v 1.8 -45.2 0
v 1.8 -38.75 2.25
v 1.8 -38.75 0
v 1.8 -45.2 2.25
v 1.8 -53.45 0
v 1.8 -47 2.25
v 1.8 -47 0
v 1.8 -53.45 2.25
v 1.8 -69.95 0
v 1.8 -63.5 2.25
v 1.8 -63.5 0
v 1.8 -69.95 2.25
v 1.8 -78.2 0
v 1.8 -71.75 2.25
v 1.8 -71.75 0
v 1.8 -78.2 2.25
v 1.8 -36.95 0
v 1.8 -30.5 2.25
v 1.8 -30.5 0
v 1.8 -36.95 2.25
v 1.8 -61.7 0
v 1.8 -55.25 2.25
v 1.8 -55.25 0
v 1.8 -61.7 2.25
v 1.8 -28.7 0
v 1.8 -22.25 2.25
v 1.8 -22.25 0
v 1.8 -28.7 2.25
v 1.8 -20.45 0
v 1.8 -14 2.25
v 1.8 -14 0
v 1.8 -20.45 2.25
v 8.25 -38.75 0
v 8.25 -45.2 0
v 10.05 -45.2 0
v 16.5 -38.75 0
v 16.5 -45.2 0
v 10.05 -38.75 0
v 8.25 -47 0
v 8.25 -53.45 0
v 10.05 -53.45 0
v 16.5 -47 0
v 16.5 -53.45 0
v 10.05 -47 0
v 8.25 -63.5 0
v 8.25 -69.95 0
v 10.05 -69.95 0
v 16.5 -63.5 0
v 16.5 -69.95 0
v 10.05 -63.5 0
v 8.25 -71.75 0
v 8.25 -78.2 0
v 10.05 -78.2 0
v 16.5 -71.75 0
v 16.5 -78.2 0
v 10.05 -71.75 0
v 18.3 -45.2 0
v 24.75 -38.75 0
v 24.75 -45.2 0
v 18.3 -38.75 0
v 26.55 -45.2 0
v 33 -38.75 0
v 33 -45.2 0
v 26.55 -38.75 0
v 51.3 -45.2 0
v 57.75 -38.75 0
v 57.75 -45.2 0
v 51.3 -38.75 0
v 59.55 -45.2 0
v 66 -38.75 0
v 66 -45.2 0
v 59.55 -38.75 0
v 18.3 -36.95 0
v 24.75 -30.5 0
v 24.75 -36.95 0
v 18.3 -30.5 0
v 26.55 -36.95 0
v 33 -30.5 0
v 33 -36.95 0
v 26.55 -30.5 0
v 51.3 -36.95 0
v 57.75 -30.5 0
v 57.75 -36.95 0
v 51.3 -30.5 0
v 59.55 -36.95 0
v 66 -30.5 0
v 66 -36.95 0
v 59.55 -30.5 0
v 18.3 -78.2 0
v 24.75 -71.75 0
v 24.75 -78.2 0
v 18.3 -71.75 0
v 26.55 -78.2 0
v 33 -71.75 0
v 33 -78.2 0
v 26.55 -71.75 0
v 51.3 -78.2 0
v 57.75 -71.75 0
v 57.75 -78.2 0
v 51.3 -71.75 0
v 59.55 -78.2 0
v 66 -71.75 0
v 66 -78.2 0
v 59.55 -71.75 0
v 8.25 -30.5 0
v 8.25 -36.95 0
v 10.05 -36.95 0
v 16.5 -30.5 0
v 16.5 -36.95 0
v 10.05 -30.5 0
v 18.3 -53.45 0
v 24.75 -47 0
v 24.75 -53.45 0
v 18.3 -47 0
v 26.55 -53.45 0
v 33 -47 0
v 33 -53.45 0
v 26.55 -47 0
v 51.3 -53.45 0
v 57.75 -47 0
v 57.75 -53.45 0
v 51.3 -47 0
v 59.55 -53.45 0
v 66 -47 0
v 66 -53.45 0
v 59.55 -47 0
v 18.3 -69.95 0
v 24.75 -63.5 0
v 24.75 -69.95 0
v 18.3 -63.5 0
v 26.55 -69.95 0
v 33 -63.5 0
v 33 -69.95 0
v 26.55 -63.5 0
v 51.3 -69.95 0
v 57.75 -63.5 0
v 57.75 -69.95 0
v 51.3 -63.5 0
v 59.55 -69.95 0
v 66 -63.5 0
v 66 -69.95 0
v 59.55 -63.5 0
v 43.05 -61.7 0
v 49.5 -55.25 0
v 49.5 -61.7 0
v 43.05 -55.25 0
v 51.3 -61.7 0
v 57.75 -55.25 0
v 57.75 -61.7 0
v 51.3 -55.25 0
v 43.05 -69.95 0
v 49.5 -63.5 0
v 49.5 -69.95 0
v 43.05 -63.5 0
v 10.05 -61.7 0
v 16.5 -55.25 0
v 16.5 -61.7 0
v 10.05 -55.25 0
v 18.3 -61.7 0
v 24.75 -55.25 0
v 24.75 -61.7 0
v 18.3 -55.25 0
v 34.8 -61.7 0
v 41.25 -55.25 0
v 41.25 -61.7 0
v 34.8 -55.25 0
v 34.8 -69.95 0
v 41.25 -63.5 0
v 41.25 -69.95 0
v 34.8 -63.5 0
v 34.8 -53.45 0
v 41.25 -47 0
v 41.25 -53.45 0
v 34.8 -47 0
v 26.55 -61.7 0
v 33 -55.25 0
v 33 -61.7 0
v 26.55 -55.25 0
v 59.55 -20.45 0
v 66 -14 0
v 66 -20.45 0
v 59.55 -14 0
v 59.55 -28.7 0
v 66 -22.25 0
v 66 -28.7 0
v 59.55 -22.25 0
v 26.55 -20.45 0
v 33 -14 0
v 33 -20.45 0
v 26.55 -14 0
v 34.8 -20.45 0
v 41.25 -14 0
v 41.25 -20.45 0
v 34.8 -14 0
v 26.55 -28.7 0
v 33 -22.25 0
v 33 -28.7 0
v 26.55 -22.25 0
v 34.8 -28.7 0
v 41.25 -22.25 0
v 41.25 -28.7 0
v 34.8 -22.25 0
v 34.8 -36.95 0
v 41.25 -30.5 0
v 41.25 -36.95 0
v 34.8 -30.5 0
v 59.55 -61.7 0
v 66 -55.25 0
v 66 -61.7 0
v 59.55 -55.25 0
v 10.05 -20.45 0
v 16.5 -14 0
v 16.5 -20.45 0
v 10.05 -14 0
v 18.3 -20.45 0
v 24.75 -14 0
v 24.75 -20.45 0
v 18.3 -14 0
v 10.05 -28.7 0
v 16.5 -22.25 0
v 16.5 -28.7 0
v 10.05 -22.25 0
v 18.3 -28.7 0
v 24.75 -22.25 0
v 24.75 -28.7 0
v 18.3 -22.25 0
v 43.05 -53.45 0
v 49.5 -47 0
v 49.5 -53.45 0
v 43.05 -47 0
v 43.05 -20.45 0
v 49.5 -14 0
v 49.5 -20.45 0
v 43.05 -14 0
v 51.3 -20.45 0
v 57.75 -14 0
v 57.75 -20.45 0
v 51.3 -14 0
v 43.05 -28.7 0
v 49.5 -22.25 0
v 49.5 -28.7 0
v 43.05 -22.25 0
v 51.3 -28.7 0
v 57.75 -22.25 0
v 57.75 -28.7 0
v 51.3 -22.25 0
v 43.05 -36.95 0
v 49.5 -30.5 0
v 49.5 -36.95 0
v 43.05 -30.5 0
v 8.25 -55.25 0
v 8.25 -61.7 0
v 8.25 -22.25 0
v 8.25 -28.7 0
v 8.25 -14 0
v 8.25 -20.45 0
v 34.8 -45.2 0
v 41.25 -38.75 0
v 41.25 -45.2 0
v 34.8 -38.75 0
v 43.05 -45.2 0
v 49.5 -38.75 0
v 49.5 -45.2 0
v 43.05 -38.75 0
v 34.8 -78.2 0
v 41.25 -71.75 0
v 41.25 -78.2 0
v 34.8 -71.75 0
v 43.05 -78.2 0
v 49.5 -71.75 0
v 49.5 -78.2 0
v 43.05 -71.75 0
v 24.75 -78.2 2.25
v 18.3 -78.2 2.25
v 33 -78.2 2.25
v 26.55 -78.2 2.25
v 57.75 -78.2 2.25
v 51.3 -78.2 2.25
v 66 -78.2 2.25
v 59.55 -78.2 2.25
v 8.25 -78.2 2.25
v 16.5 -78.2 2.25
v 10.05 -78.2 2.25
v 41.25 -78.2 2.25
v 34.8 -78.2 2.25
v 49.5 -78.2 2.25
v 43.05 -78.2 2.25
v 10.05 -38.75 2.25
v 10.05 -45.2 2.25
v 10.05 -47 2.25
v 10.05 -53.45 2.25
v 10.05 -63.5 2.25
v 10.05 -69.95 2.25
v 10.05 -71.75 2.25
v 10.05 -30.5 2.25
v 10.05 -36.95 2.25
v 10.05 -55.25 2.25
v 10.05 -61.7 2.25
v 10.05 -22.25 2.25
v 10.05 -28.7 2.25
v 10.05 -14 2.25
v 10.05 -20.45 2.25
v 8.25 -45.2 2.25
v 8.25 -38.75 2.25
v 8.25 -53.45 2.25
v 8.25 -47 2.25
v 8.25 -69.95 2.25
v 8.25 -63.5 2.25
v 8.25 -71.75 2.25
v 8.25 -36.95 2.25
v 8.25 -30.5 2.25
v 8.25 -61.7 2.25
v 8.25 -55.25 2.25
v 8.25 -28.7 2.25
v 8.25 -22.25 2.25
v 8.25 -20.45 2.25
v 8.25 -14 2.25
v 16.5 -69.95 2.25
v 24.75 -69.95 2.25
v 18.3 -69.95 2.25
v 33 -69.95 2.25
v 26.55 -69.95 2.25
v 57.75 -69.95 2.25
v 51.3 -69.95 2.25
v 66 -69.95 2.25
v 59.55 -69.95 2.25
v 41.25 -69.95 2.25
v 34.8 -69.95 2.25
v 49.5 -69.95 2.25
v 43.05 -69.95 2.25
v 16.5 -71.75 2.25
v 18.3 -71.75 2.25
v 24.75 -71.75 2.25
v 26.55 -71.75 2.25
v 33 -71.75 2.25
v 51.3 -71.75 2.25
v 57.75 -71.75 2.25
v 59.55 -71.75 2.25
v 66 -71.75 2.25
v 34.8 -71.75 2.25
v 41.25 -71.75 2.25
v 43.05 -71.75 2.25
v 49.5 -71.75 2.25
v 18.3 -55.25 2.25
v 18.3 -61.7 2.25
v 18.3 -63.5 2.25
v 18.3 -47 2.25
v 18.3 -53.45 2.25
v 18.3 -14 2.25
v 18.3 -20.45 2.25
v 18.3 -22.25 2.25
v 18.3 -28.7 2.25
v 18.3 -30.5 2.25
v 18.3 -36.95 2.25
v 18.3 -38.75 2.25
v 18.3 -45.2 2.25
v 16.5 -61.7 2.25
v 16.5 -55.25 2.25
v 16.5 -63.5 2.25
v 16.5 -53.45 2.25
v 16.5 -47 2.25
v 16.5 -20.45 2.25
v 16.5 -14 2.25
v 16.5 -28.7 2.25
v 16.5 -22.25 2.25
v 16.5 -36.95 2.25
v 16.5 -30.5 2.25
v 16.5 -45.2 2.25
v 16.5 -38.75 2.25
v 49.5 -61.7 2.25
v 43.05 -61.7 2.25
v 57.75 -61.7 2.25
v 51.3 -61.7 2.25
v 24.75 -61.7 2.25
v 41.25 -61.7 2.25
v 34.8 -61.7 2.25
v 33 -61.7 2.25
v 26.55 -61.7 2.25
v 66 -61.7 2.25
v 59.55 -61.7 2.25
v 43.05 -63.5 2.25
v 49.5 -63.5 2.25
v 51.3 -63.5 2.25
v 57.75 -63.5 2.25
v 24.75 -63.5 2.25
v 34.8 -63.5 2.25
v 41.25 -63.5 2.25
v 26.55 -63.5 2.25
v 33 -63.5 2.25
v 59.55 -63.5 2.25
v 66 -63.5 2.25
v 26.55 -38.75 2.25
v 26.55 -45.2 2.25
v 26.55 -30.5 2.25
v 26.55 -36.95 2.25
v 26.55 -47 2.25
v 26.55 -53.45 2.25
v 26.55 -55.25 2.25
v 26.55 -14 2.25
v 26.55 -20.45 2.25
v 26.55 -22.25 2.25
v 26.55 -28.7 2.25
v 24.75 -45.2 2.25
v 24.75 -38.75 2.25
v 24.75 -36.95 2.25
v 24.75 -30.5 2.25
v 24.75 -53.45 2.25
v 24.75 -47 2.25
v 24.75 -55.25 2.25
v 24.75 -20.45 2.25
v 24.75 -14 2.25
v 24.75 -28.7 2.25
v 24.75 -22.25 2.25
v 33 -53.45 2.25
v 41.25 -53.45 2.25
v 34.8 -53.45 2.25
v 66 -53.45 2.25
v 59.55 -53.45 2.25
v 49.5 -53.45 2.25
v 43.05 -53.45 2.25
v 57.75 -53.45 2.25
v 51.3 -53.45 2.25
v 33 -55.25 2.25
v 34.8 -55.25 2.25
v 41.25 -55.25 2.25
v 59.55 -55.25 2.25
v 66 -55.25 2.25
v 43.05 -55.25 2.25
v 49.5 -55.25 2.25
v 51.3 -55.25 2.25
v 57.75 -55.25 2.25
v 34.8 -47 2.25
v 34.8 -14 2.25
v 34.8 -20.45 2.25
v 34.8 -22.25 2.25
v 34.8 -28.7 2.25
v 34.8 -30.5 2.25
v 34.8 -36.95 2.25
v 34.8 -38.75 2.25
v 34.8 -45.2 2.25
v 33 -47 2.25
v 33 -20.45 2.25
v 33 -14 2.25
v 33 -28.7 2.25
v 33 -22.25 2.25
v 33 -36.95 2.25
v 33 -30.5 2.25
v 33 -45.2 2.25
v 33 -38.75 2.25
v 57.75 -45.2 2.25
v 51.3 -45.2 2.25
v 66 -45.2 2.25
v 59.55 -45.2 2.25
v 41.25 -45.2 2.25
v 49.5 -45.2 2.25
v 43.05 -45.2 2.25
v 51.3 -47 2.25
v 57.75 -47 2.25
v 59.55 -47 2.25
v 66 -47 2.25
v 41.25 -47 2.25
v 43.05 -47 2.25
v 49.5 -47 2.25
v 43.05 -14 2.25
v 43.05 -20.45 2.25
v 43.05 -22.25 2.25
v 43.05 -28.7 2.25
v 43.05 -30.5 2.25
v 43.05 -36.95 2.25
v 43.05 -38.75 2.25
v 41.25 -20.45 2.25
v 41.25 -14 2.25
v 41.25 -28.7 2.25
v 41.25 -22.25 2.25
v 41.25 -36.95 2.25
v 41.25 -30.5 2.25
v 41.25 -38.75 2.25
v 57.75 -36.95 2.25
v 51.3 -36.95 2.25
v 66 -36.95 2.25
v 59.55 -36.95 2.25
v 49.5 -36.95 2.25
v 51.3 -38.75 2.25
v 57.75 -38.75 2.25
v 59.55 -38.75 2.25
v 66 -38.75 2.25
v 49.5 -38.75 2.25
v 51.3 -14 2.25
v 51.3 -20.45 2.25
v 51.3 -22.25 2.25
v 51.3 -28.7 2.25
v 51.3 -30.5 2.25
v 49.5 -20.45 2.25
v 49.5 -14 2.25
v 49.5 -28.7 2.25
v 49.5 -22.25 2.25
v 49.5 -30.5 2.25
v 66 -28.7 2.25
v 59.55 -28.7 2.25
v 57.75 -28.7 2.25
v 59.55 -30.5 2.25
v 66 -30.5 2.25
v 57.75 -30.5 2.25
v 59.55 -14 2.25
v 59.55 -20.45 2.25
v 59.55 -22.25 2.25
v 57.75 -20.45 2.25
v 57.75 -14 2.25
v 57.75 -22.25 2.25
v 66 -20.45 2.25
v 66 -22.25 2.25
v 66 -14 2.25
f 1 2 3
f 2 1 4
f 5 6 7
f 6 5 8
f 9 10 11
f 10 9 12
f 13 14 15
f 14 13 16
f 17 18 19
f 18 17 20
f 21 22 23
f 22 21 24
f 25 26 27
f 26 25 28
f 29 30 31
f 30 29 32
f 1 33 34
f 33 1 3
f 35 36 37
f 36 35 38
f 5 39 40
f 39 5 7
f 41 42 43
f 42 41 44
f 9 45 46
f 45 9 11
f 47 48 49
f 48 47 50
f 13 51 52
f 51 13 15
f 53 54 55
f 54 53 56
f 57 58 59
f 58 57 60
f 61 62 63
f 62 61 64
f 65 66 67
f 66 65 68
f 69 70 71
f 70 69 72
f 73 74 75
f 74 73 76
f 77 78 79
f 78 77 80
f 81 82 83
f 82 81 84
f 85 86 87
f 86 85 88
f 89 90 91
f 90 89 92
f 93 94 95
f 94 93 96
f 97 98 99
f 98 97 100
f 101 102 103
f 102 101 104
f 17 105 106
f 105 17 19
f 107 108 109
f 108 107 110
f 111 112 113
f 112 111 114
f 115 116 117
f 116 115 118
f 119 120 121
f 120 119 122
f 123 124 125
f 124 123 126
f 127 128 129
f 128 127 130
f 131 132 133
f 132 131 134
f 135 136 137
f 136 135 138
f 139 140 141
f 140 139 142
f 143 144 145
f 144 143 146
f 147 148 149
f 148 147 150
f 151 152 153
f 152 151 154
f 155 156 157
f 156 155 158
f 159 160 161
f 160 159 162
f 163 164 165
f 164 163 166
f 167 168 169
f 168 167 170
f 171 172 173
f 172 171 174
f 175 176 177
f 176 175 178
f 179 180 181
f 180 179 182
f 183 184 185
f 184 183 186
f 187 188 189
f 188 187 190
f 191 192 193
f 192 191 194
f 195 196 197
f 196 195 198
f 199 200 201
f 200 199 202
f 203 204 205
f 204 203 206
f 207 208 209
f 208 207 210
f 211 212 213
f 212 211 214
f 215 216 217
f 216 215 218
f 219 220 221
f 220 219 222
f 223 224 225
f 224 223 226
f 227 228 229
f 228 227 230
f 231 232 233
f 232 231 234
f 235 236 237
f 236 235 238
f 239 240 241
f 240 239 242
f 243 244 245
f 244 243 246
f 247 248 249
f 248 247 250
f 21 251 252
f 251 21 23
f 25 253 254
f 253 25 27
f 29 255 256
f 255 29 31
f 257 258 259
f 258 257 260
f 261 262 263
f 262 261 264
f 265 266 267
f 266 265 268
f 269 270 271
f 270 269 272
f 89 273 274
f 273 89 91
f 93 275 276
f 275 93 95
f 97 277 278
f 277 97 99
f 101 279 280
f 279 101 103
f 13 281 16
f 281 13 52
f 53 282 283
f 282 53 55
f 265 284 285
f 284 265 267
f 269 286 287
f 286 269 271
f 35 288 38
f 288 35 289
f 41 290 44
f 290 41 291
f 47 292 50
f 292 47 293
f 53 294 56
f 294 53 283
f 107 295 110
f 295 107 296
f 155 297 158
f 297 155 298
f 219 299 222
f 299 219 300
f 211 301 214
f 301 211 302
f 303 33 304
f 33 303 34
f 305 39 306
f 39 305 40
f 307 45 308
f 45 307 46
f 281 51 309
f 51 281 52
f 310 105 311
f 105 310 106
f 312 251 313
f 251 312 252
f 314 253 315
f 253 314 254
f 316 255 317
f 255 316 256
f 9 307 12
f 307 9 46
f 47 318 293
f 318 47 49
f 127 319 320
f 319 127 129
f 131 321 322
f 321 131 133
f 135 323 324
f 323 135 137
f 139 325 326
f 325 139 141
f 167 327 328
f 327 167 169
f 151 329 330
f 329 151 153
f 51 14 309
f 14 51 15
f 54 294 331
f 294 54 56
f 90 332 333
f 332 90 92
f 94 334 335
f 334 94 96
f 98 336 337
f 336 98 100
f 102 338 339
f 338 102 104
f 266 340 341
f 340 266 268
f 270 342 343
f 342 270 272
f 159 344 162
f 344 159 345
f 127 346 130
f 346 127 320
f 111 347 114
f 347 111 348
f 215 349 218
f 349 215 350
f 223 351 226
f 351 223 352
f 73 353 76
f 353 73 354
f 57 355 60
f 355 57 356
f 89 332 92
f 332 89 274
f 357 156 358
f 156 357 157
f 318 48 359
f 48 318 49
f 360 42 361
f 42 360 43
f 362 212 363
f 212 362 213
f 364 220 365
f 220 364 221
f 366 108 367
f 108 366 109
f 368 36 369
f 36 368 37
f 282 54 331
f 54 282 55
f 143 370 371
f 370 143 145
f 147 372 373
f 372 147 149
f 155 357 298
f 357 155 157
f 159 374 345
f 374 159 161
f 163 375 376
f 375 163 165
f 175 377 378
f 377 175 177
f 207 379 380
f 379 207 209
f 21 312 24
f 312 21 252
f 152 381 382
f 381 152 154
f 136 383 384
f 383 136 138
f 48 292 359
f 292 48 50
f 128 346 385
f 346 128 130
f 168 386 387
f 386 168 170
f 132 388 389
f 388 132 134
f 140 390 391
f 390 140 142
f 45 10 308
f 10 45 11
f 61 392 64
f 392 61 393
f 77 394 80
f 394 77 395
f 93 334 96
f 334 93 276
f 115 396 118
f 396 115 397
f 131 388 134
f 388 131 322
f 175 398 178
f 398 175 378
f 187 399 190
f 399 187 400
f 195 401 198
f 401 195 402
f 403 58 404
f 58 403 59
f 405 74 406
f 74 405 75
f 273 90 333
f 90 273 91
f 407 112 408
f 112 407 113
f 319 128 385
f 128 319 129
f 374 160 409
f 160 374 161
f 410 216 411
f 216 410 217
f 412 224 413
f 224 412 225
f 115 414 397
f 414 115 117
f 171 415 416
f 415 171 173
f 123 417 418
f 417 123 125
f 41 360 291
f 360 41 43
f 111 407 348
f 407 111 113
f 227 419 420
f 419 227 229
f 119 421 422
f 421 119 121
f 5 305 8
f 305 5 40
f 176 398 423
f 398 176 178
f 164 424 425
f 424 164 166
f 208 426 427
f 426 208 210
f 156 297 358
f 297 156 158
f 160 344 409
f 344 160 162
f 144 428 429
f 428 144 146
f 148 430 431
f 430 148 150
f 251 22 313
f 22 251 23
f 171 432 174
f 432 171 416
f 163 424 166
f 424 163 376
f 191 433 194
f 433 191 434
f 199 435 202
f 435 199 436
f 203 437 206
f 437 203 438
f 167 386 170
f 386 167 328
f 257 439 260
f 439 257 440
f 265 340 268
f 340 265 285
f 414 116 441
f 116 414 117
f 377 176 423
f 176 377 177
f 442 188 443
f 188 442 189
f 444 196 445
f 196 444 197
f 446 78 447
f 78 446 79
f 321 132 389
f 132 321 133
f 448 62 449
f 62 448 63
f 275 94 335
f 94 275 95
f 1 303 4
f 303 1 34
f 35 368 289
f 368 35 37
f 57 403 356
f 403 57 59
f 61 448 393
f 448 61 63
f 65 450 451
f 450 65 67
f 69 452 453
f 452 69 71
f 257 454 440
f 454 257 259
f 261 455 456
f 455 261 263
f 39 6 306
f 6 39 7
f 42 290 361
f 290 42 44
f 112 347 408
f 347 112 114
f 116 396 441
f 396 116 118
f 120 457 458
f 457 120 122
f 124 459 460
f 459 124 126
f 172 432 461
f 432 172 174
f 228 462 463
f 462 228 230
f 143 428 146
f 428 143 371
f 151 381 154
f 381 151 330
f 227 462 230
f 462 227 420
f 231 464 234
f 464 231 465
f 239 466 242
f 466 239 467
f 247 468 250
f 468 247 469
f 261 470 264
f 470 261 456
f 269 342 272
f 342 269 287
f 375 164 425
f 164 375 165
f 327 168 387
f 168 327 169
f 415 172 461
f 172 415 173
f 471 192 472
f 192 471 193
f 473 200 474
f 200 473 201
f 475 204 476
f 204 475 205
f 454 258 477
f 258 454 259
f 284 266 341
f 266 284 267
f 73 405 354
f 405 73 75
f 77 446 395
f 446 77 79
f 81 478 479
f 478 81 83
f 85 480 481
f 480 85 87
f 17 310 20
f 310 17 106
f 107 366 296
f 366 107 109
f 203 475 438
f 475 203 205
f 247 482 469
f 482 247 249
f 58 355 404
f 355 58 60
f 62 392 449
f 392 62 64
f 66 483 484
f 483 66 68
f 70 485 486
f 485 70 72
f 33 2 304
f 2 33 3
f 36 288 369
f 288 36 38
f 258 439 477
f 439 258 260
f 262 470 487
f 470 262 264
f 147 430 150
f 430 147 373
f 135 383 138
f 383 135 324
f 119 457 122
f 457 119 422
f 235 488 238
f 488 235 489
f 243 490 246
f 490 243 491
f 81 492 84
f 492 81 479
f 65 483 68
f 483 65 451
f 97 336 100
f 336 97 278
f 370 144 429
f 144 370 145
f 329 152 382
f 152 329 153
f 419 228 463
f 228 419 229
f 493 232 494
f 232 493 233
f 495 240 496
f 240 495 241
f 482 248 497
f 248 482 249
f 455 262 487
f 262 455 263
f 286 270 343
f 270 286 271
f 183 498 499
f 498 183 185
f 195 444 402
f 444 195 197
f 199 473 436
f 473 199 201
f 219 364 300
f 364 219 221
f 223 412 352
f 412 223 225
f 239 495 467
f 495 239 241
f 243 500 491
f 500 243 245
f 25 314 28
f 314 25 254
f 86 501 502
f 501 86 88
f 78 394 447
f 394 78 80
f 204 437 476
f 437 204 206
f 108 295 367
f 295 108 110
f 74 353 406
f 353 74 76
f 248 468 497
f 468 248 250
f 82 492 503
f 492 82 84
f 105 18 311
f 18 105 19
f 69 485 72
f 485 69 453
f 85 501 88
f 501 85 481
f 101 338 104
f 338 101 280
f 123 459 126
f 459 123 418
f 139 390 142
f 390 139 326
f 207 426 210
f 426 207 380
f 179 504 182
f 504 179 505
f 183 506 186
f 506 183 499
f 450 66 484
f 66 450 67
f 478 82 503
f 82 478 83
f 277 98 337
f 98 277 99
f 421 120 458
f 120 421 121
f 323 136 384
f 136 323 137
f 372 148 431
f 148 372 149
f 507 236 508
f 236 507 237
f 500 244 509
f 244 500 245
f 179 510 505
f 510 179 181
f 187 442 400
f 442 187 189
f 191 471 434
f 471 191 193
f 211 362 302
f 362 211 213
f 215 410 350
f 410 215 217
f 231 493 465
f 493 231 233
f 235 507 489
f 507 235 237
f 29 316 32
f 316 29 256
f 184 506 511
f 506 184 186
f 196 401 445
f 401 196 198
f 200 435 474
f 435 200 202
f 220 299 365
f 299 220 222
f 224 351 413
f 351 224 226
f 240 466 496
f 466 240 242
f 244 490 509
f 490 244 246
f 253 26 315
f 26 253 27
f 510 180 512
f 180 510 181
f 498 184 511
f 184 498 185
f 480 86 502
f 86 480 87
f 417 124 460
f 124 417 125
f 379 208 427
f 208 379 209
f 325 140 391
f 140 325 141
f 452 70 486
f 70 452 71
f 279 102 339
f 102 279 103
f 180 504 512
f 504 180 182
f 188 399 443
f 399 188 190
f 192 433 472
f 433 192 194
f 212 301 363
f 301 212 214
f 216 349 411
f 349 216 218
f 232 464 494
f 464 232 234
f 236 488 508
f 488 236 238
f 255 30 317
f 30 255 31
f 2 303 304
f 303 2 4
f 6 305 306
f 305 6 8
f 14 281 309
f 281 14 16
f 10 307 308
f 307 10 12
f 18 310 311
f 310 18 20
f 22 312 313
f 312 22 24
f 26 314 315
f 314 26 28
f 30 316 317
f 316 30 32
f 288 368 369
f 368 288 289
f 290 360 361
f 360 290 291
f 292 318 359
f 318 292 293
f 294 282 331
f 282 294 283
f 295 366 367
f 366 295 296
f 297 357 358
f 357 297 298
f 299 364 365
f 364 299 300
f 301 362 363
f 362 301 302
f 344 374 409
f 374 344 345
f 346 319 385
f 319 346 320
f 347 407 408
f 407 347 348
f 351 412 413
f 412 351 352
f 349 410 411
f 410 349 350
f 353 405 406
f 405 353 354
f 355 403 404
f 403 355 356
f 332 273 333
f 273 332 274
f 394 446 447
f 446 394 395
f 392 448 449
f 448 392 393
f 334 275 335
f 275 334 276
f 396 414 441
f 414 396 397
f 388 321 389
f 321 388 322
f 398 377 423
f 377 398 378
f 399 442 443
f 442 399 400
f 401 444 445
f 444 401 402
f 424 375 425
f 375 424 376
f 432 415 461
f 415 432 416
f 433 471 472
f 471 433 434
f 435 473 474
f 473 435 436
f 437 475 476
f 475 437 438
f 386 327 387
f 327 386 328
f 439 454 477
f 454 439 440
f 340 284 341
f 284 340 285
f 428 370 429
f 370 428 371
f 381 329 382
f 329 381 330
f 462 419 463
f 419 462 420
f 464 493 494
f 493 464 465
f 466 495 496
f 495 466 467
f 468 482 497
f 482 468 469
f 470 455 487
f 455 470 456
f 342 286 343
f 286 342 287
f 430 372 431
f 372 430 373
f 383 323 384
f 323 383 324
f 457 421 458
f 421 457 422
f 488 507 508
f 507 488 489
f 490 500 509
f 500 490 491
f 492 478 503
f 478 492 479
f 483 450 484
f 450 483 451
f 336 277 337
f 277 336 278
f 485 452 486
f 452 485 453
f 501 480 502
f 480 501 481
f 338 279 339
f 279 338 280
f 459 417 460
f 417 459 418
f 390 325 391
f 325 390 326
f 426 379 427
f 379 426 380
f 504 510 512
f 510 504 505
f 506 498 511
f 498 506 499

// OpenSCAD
letters = [ 
    ["D", "I", "O", "N", "C", "E", "Z", "S"],
    ["N", "U", "S", "I", "E", "T", "V", "E"],
    ["C", "I", "N", "O", "C", "H", "O", "I"],
    ["C", "U", "A", "T", "R", "E", "O", "S"],
    ["Y", "M", "E", "N", "O", "S", "M", "E"],
    ["C", "U", "A", "R", "T", "O", "D", "I"],
    ["V", "E", "I", "N", "T", "I", "E", "A"],
    ["D", "C", "I", "N", "E", "Z", "C", "O"],    
];

$fn = 64;
max = 66;   // led side?
s = 66/8;
d_h = 5;    // led dividers?
w_h = 10;   // face height
b_h = 5;    // dividers height
c_h = 35;   // base height
letter_depth = w_h+1;

diffusers_height = 2.25;

font_face = "stencil std";
font_brand = "futura";

module face()
{
	for (r = [0:7])
	{
		for (c = [0:7])
		{
			#translate([r*s + s/2+.4, c*s+s/2+.5, 0])
				linear_extrude(height = letter_depth+1)
					text(
						letters[7-c][r], 
						font = font_face,
						size=6, 
						$fn=20, 
						valign="center", 
						halign = "center"
					);
		}
	}
}

module case_front()
{
	difference()
	{
		union()
		{
			translate([-5,-5,0]) 	cube([5,max+6+5, w_h]);	// left side
			translate([max+1,-5,0])	cube([5,max+6+5, w_h]); // right side 
			translate([0,max+1,0]) 	cube([max+2, 5, w_h]);	// top
			translate([-1,-5,0])	cube([max+3, 5, w_h]); 	// bottom
		}
		
		// mounting holes
		
		translate([-1.5,-1.5,0]) 			cylinder(d=2.4,h=w_h-2);	// ll 
		translate([max+1+1.5,-5+3.5,0]) 	cylinder(d=2.4,h=w_h-2);	// lr
		translate([-1.5,max+1+1.5,0]) 		cylinder(d=2.4,h=w_h-2);	// ul
		translate([max+1+1.5,max+1+1.5,0])	cylinder(d=2.4,h=w_h-2);	// ur 
	}
}

module dividers(w=1)
{
	for (x = [0:8])
	{
		translate([s*x, 1, 0]) cube([w,max,d_h]);
		translate([0, s*x,0]) cube([max+1, w, d_h]);
	}
}

module clock_face()
{
	difference()
	{
		union()
		{
			translate([0,0,w_h-1]) cube([max+1,max+1,1]);
			translate([0,0,b_h]) dividers();
		}
		face();
	}
	case_front();
}

module diffusers()
{
	difference()
	{
		translate([1,1,0]) cube([max,max,diffusers_height]);
		dividers(1.8);
	}	
    //translate([1,1,diffusers_height]) cube([max,max,0.30]);
}

module standoff( height, width_bottom, width_top)
{
	difference()
	{
		cylinder(d1=width_bottom,d2=width_top,h=height);
		translate([0,0,height-10+1])	cylinder(d=2.5, h=10);
	}
}

module case_back()
{
	difference()
	{
		union()
		{
			cube([max+1, max+1, 2]);
			translate([   -5,  -5, 0]) 		cube([5    , max+6+5, c_h]);	// left side
			translate([max+1,  -5, 0])		cube([5    , max+6+5, c_h]);    // right side 
			translate([    0, max, 0]) 	    cube([max+2,       6, c_h]);	// top
			translate([   -1,  -5, 0])		cube([max+2,       6, c_h]); 	// bottom
            
            // reinforcement bottom left
            translate([ -1, -1, 0])      
                linear_extrude(height = c_h, convexity = 10, twist = 0)
                polygon(points=[[0,0],[10,0],[0,10]], paths=[[0,1,2]]);

            // reinforcement bottom right
            #translate([ -1, max+1, 0])      
                linear_extrude(height = c_h, convexity = 10, twist = 0)
                polygon(points=[[0,0],[10,0],[0,-10]], paths=[[0,1,2]]);
            
            // reinforcement top left
            translate([ max+1, -1, 0])      
                linear_extrude(height = esp_height+2, convexity = 10, twist = 0)
                polygon(points=[[0,0],[-9,0],[0,9]], paths=[[0,1,2]]);
            
            // reinforcement top right
            translate([ max+1, max+1, 0])      
                linear_extrude(height = esp_height+2, convexity = 10, twist = 0)
                polygon(points=[[0,0],[-11,0],[0,-11]], paths=[[0,1,2]]);
		}
		
		// mount holes 
        screwDeep = 17;
		translate([     -1.5,      -1.5, 0]) 	cylinder(d=3,h=c_h+1);	// ll 
		translate([max+1+1.5,    -5+3.5, 0]) 	cylinder(d=3,h=c_h+1);	// lr
		translate([     -1.5, max+1+1.5, 0]) 	cylinder(d=3,h=c_h+1);	// ul
		translate([max+1+1.5, max+1+1.5, 0])	cylinder(d=3,h=c_h+1);	// ur 
		
		translate([     -1.5,      -1.5, 0]) 	cylinder(d=5.5,h=c_h-screwDeep);	// ll 
		translate([max+1+1.5,    -5+3.5, 0]) 	cylinder(d=5.5,h=c_h-screwDeep);	// lr
		translate([     -1.5, max+1+1.5, 0]) 	cylinder(d=5.5,h=c_h-screwDeep);	// ul
		translate([max+1+1.5, max+1+1.5, 0])	cylinder(d=5.5,h=c_h-screwDeep);	// ur 
        
        // ventilation grill
        tol = 0.2;
        translate([14,16.5,0])	
             difference(){
               linear_extrude(height = 10)
               cube([16,30,10]);
               for (y=[0:6:30]){
                   translate([0,y,0]){
                     cube([20,3,5]);
                   }
               }
             }
        
        // slots for LED connector
        led_connector_deep = 9;
		#translate([max-12, max-0.5, c_h-led_connector_deep])	cube([12, 4.5, led_connector_deep]); 	
		#translate([     1,      -3, c_h-led_connector_deep])	cube([12, 10, led_connector_deep]);
            
		// power socket cutout
		translate([5,(max/2),0])
			 cylinder(d=9,h=6, center=true);
		
        // brand
        /*
		translate([max/2+15,max/2,0.3]) rotate([180,0,90])
					linear_extrude(height = 0.3)
					text(
						"Word-Clock", 
						font = font_brand,
						size=6, 
						$fn=20, 
						valign="center", 
						halign = "center"
					);
        */
	}
    
    // debug modules
    //#translate([6, 13, 3])	cube([28, 40, 23]); 	// AC-DC
    //#translate([35, 3, 5])	cube([31, 60, 18]); 	// ESP
    
    // strandoffs
    width_bottom = 8;
    width_top = 8;
    
	// standoffs for AC-DC
    acdc_height = 24;
    acdc_length = 50;
    acdc_x = 5+5+9;
    acdc_y = 8;
	translate([acdc_x, acdc_y             , 2]) standoff(acdc_height, width_bottom, width_top);
	translate([acdc_x, acdc_y+acdc_length , 2]) standoff(acdc_height, width_bottom, width_top);
    
	// standoffs for ESP 
    esp_height = 21;
    esp_width = 25;
    esp_length = 52;
    esp_x = 5+5+28;
    esp_y = 6;
	translate([esp_x          , esp_y             , 2]) standoff(esp_height, width_bottom, width_top);
	translate([esp_x+esp_width, esp_y             , 2]) standoff(esp_height, width_bottom, width_top);
	translate([esp_x          , esp_y+esp_length  , 2]) standoff(esp_height, width_bottom, width_top);
	translate([esp_x+esp_width, esp_y+esp_length  , 2]) standoff(esp_height, width_bottom, width_top);
    
    // aditional supports for AC-DC
	#translate([acdc_x-(width_top/2), 0    , 2])    cube([8,8,14]);
	#translate([acdc_x-(width_top/2), max-9, 2]) 	cube([8,9,14]);

    // aditional supports for ESP 
	#translate([esp_x-(width_top/2),     0, 2])     cube([8,4.7,esp_height]);
	#translate([esp_x-(width_top/2), max-6.5, 2])   cube([8,7,esp_height]); 
}

// uncomment for clock face
//translate([-15,0,10]) rotate([0,180,0]) clock_face();

// uncomment for led diffusers
translate([0,-80,0]) diffusers();

// uncomment for back of case
//case_back();
